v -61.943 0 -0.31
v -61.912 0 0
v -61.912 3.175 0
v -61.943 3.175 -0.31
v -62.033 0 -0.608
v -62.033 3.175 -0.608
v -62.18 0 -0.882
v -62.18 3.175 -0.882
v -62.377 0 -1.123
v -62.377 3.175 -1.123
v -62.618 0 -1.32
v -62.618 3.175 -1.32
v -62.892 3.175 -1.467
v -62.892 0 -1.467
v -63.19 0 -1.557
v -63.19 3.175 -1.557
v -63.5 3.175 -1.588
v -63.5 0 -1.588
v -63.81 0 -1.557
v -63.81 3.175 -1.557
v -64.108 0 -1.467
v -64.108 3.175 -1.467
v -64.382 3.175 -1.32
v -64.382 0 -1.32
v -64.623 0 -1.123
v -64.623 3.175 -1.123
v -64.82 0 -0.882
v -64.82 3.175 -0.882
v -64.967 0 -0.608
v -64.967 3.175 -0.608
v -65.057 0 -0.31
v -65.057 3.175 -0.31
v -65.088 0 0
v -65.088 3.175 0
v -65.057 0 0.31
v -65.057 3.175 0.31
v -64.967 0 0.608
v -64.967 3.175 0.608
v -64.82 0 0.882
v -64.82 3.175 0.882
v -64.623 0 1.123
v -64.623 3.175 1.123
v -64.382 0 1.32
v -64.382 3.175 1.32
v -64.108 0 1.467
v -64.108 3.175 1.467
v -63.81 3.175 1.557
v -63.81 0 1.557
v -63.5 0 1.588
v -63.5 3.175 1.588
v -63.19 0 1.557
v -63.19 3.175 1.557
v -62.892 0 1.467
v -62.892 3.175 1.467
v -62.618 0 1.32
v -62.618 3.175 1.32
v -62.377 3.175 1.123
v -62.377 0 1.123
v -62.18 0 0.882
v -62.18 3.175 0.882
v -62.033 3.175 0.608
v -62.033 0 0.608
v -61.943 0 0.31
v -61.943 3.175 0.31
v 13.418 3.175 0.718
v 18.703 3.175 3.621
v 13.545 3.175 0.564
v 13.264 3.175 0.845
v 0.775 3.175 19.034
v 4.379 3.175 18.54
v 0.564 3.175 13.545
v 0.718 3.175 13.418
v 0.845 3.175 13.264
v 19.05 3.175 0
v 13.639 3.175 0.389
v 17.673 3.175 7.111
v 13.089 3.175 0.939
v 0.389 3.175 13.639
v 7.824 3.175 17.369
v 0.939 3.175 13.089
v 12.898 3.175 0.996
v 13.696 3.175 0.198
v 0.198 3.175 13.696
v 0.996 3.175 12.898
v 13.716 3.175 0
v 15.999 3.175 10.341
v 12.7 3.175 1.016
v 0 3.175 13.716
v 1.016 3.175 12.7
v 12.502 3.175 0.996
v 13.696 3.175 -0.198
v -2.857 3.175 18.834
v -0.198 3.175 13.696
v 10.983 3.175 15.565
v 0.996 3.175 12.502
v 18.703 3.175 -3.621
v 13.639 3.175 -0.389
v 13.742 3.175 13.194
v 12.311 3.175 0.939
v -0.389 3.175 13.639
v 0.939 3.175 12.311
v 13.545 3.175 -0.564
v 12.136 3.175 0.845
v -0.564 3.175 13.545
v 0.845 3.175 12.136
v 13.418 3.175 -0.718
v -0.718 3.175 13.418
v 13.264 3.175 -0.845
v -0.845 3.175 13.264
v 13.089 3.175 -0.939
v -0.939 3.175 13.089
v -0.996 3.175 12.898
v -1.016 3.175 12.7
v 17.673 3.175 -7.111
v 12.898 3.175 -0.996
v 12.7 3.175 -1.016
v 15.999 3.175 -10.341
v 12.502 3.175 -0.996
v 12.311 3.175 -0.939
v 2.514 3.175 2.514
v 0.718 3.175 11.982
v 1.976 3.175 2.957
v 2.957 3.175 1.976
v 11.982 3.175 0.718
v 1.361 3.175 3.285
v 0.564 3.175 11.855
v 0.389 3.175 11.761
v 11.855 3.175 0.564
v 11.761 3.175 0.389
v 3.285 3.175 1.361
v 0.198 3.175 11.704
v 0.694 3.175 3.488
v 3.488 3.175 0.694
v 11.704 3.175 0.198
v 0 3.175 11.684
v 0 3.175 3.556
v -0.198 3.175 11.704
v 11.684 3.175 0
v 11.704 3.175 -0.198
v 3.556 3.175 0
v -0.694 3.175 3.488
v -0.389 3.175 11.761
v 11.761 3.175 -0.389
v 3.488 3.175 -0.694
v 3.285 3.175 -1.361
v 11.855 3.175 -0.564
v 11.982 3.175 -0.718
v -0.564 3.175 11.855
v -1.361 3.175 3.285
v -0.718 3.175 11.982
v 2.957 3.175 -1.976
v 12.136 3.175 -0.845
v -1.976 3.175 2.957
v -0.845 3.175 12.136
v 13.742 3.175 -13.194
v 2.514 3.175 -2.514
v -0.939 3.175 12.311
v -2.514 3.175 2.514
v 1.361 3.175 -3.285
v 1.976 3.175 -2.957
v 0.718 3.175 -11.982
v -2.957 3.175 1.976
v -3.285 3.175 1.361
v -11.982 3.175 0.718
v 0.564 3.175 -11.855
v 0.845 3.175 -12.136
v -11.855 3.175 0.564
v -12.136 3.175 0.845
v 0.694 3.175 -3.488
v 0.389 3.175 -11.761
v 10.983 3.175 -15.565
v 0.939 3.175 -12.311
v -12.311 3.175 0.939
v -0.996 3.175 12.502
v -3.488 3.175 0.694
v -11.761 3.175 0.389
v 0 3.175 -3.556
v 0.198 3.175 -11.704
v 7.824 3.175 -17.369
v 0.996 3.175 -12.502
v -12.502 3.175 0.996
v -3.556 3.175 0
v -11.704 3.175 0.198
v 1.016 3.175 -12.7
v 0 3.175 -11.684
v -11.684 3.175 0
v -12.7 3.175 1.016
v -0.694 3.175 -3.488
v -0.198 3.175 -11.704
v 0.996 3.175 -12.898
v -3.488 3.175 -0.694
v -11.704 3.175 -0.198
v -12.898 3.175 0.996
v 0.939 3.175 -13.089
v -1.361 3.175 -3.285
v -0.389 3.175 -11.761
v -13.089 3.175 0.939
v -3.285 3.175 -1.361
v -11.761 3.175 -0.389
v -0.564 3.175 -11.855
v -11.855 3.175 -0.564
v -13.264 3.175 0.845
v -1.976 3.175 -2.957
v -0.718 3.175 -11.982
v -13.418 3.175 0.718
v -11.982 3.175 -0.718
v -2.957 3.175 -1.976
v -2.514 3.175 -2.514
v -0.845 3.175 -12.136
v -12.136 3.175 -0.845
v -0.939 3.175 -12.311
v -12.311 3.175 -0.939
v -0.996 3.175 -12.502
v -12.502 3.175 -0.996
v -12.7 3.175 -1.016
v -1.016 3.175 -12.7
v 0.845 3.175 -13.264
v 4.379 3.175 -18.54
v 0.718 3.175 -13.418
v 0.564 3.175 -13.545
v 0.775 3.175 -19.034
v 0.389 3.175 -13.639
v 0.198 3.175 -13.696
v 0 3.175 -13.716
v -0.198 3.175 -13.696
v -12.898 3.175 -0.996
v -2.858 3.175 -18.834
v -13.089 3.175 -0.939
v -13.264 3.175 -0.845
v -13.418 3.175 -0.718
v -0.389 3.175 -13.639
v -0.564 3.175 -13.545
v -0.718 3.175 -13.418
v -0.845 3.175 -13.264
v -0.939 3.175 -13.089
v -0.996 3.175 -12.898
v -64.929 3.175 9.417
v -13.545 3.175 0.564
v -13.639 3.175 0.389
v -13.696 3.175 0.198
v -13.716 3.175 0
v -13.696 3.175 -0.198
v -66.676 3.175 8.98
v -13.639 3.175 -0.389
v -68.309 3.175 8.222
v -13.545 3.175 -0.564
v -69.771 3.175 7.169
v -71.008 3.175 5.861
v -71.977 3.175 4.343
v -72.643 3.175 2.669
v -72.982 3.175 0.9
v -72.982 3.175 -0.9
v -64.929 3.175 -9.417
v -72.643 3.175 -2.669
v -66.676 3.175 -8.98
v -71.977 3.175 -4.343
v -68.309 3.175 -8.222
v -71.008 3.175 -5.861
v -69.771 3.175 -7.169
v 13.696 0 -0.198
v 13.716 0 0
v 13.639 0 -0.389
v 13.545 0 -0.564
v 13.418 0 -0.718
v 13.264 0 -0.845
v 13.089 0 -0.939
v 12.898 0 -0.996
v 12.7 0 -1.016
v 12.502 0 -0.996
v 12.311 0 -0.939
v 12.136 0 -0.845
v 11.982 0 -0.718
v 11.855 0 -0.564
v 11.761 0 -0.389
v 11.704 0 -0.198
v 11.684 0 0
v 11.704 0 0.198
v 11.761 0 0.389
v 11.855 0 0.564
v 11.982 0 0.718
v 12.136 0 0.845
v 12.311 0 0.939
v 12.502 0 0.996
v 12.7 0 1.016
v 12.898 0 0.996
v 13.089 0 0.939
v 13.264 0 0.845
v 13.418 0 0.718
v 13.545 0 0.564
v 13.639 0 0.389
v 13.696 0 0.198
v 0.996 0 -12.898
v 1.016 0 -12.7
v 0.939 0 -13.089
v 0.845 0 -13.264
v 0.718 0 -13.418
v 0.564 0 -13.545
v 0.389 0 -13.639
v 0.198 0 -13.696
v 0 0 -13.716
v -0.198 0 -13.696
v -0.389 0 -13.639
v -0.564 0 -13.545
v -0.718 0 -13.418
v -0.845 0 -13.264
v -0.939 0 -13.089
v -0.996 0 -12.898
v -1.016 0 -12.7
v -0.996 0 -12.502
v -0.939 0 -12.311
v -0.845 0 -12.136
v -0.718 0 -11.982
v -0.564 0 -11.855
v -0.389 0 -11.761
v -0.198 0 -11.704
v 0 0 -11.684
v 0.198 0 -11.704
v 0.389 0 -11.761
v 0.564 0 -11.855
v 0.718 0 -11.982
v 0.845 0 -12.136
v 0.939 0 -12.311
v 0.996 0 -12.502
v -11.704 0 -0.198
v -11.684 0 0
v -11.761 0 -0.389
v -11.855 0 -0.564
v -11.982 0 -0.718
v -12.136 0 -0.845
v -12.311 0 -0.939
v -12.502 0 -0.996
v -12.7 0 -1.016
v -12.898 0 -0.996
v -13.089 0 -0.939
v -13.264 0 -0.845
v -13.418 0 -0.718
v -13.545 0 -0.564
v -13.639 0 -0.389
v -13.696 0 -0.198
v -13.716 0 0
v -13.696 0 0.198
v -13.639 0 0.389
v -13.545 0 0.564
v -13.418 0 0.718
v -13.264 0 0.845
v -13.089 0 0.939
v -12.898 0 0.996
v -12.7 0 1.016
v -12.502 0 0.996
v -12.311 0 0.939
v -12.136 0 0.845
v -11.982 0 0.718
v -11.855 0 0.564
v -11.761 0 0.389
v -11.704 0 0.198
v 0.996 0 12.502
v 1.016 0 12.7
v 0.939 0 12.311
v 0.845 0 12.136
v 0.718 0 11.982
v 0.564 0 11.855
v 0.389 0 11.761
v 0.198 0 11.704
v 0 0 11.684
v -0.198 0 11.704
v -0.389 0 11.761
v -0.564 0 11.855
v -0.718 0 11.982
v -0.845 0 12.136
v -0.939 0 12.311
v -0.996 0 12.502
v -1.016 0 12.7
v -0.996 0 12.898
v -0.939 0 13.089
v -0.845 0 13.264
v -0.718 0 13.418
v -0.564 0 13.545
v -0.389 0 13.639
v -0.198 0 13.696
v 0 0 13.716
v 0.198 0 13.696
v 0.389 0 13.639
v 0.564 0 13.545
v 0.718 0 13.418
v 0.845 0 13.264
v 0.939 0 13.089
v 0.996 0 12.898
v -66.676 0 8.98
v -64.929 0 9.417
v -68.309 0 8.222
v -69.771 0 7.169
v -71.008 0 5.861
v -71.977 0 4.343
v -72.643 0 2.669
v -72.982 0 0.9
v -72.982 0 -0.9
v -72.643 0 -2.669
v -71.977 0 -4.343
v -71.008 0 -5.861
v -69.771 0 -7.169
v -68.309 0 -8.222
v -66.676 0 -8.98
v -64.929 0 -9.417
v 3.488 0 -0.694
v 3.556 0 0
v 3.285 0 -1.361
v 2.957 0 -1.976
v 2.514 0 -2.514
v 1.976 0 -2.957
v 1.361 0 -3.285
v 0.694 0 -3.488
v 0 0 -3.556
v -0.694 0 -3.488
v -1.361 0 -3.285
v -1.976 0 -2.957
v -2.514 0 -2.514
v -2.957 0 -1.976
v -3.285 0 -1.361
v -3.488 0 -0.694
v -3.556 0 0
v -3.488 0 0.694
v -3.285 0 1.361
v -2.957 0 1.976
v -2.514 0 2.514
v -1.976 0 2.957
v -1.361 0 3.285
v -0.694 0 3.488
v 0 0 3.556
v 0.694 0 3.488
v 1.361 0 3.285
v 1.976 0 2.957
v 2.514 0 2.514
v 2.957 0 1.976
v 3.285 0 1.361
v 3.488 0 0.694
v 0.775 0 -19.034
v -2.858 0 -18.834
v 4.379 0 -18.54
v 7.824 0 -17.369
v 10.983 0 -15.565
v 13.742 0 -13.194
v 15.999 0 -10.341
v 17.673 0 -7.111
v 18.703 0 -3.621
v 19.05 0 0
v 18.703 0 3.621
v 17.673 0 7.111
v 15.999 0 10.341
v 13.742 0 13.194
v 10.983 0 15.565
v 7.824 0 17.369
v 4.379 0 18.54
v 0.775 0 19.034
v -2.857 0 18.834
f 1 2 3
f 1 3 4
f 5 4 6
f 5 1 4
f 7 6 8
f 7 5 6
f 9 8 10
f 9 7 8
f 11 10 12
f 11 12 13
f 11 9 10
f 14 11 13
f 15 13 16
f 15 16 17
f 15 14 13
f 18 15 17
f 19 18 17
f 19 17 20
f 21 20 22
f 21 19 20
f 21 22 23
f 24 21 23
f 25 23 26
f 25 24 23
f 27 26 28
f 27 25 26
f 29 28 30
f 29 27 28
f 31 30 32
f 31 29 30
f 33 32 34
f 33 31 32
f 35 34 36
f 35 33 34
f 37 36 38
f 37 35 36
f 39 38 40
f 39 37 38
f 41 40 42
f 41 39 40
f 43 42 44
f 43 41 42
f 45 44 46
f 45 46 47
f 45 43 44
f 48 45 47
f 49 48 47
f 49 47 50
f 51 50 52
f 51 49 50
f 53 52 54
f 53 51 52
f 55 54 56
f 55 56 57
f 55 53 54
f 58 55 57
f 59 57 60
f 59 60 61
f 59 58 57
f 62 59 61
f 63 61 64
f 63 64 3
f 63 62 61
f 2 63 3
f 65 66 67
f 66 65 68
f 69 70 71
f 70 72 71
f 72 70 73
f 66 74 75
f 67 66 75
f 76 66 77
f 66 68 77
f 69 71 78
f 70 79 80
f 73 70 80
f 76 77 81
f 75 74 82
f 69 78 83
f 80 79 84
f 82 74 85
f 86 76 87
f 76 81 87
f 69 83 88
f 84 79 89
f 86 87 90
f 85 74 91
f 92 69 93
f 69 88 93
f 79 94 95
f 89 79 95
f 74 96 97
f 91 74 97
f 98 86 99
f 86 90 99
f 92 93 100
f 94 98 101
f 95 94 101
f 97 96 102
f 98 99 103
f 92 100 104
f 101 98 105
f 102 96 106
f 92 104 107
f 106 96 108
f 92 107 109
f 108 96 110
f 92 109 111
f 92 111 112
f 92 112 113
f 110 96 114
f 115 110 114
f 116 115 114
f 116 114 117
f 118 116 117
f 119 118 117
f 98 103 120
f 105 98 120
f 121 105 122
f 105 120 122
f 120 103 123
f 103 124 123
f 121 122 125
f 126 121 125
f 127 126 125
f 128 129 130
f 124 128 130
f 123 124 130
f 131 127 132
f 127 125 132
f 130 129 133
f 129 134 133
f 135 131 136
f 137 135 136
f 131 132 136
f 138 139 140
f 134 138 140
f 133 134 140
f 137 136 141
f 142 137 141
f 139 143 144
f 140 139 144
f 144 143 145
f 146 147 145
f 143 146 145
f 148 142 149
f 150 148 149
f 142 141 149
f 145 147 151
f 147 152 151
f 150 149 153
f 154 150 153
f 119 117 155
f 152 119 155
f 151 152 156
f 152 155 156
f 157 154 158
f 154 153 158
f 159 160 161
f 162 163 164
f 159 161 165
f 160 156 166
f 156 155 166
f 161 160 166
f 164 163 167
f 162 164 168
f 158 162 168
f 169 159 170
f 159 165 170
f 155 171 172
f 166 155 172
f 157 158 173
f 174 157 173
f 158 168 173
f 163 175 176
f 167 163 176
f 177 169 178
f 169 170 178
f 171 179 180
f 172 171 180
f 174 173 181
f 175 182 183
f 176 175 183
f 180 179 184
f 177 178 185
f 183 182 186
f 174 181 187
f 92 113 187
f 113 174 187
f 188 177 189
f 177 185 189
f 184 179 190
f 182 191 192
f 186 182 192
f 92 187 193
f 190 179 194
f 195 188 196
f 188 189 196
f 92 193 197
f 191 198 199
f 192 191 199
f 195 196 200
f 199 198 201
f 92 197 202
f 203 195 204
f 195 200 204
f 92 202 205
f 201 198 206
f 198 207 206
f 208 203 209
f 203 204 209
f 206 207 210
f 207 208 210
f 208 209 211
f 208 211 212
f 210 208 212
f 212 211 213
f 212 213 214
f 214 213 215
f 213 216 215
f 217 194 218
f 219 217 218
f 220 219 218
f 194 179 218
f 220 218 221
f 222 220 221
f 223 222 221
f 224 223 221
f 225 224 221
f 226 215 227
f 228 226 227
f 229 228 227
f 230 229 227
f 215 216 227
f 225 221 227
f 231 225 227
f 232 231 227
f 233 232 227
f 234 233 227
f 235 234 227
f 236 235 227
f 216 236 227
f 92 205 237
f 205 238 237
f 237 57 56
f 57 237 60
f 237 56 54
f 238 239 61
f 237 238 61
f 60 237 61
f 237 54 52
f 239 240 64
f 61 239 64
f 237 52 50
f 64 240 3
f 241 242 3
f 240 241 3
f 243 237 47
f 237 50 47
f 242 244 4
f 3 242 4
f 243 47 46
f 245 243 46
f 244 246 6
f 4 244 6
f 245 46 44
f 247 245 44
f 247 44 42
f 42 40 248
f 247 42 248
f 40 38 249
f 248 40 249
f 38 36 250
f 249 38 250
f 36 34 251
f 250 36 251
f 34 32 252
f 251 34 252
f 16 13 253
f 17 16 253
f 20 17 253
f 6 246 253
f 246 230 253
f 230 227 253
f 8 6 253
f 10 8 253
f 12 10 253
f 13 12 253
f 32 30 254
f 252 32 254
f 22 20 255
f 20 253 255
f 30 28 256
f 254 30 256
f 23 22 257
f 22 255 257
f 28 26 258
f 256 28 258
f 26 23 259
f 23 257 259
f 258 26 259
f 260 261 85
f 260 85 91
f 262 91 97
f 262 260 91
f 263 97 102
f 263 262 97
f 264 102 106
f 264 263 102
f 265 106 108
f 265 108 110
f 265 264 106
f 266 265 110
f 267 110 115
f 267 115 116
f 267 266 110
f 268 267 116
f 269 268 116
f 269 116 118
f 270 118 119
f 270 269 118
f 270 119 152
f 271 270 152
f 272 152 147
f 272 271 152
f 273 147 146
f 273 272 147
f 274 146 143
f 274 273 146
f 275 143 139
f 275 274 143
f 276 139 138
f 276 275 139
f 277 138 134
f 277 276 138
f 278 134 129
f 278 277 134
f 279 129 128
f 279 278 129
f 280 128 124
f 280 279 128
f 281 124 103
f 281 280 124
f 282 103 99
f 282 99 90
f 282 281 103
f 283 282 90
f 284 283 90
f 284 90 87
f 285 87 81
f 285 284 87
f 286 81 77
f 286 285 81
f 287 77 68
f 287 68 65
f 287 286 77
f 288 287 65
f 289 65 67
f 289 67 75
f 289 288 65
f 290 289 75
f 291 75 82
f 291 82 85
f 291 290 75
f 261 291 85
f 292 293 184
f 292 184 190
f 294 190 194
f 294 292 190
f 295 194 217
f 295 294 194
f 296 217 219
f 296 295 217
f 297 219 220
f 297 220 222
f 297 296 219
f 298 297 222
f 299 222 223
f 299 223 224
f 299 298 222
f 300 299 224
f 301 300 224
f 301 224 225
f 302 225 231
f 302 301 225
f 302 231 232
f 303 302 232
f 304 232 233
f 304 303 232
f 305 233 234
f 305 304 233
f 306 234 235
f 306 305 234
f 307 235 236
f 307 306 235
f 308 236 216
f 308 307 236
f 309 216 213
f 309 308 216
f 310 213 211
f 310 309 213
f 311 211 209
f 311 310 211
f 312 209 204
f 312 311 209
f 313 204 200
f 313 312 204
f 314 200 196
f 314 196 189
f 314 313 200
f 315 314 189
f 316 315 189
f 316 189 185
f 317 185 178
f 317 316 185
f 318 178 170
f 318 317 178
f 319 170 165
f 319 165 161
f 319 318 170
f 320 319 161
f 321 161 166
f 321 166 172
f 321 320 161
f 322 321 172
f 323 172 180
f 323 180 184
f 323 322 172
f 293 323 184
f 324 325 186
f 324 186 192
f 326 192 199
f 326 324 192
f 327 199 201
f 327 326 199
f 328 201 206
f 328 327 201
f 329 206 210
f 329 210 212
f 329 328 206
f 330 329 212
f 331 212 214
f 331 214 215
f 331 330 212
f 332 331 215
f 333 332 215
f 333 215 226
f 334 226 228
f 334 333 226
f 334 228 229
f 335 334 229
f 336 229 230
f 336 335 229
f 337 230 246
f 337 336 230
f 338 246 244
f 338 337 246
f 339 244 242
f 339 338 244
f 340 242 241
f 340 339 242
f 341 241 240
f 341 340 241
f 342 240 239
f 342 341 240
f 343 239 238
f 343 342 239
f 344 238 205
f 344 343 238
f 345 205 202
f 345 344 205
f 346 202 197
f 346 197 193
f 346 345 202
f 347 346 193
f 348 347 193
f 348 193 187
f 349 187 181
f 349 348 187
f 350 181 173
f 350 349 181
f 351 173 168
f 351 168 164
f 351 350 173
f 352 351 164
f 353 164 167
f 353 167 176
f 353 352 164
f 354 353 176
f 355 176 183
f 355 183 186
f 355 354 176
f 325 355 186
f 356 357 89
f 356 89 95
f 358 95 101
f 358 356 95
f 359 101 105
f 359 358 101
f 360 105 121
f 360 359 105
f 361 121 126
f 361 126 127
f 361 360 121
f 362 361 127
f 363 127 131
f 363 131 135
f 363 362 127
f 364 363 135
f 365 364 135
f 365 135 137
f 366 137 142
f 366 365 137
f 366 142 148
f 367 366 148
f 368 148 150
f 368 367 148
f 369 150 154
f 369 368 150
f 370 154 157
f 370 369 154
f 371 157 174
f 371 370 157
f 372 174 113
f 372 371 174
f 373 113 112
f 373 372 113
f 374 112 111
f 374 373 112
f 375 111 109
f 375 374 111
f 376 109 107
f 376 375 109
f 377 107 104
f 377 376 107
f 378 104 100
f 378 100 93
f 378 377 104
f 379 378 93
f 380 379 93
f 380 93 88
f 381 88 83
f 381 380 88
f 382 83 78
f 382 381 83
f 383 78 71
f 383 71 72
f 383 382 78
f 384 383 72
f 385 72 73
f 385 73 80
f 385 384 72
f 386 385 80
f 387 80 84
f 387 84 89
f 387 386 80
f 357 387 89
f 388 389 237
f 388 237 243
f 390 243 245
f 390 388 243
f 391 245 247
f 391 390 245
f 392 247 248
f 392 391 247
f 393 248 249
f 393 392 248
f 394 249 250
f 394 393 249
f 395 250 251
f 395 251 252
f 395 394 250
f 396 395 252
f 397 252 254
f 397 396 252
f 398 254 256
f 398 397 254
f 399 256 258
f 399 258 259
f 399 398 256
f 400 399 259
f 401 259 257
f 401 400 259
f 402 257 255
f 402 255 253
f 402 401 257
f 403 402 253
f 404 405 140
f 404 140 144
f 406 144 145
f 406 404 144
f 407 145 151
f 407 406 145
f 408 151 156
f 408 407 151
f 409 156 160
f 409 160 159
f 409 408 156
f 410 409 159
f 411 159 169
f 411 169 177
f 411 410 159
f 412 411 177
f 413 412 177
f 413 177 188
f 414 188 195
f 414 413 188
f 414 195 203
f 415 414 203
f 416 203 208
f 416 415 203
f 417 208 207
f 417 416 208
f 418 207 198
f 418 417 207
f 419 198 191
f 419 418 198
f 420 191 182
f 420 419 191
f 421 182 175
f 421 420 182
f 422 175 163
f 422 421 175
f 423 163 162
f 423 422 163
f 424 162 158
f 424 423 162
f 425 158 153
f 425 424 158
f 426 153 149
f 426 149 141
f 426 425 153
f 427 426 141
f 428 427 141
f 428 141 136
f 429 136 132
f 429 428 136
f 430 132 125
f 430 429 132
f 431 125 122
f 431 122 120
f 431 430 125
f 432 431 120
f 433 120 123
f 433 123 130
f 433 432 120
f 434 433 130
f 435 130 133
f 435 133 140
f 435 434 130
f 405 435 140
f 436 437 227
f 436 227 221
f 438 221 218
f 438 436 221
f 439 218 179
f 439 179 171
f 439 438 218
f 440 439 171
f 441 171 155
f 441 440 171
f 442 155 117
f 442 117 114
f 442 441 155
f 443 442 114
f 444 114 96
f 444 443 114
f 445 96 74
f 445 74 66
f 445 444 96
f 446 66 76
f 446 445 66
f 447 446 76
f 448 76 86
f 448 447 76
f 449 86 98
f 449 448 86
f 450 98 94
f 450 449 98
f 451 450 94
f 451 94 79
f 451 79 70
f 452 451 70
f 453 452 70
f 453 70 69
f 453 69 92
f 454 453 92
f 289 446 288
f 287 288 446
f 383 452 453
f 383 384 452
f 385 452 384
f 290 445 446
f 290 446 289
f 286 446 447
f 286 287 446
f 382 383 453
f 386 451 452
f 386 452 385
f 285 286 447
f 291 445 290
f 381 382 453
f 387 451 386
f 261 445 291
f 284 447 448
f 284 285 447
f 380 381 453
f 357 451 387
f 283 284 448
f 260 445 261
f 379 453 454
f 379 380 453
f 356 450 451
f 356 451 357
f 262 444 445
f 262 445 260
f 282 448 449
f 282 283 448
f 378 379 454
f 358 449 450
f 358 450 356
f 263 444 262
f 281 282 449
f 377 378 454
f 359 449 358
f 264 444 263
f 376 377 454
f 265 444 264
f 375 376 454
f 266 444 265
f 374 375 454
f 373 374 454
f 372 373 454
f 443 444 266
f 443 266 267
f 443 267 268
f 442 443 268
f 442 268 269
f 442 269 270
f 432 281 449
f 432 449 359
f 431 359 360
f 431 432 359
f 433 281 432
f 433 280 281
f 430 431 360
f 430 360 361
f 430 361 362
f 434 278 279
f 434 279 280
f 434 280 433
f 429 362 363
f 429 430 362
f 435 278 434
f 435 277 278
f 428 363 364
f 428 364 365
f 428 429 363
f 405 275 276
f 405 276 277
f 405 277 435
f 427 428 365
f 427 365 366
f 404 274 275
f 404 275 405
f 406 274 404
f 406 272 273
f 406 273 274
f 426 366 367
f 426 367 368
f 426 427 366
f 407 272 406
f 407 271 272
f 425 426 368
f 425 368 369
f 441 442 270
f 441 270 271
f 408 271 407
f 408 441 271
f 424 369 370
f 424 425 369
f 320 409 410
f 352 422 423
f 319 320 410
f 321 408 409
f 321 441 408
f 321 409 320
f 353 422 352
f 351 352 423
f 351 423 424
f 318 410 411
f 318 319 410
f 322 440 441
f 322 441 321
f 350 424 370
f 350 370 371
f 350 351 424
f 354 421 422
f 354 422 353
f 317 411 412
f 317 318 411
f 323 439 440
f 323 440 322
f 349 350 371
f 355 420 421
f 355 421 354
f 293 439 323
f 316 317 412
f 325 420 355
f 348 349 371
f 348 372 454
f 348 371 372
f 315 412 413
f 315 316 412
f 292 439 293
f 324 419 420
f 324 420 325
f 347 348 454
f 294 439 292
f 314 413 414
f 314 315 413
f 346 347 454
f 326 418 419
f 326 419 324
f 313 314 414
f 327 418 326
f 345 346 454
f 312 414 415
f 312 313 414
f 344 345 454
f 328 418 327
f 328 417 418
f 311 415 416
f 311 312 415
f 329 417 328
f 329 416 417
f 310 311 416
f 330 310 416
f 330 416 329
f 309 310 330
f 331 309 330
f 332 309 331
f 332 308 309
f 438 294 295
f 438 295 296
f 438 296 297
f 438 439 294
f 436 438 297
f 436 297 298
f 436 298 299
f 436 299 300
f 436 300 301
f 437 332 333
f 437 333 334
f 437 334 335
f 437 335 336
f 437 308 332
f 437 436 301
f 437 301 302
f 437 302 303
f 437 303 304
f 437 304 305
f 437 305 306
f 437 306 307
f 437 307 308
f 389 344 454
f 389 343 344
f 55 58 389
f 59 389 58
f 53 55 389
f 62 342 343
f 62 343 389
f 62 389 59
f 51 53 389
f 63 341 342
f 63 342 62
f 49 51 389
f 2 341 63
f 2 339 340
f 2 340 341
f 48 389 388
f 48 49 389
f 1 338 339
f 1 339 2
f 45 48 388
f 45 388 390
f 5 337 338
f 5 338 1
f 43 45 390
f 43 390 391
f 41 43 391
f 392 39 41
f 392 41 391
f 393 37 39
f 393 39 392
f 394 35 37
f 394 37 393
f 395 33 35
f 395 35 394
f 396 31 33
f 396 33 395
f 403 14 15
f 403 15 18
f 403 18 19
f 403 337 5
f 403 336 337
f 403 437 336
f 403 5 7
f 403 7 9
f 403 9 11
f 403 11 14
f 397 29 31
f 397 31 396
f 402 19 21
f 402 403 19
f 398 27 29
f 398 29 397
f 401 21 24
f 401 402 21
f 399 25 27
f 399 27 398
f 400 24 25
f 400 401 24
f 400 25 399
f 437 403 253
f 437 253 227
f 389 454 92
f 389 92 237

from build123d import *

# Parameters (mm, degrees)
SKETCH1_R           = 1.5875
SKETCH1_R_2         = 3.556
SKETCH1_R_3         = 1.016
BOSS_EXTRUDE1_DEPTH = 3.175


with BuildPart() as part:
    # Sketch1 → Boss-Extrude1 (new body)
    with BuildSketch(Plane(origin=(0, 0, 0), x_dir=(1, 0, 0), z_dir=(0, 1, 0))):
        with BuildLine():
            Line((-64.92875, 9.417234118), (-2.8575, 18.834468236))
            ThreePointArc((-2.8575, 18.834468236), (19.05, 0), (-2.8575, -18.834468236))
            Line((-2.8575, -18.834468236), (-64.92875, -9.417234118))
            ThreePointArc((-64.92875, -9.417234118), (-73.025, 0), (-64.92875, 9.417234118))
        make_face()
        with Locations((-63.5, 0)):
            Circle(SKETCH1_R, mode=Mode.SUBTRACT)
        Circle(SKETCH1_R_2, mode=Mode.SUBTRACT)
        with Locations((0, 12.7)):
            Circle(SKETCH1_R_3, mode=Mode.SUBTRACT)
        with Locations((12.7, 0)):
            Circle(SKETCH1_R_3, mode=Mode.SUBTRACT)
        with Locations((0, -12.7)):
            Circle(SKETCH1_R_3, mode=Mode.SUBTRACT)
        with Locations((-12.7, 0)):
            Circle(SKETCH1_R_3, mode=Mode.SUBTRACT)
    extrude(amount=BOSS_EXTRUDE1_DEPTH)


solid = part.part
